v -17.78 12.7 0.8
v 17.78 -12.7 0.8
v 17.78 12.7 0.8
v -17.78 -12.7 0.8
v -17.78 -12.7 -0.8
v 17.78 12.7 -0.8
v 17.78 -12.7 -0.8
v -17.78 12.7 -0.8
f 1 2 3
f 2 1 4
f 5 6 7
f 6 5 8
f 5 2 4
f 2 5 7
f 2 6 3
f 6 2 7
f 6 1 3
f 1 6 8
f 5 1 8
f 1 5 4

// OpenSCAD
$fn=64;

module pcb(length=35.56, width=25.4, thickness=1.6) {
    cube([length, width, thickness], center=true);
}

pcb();
